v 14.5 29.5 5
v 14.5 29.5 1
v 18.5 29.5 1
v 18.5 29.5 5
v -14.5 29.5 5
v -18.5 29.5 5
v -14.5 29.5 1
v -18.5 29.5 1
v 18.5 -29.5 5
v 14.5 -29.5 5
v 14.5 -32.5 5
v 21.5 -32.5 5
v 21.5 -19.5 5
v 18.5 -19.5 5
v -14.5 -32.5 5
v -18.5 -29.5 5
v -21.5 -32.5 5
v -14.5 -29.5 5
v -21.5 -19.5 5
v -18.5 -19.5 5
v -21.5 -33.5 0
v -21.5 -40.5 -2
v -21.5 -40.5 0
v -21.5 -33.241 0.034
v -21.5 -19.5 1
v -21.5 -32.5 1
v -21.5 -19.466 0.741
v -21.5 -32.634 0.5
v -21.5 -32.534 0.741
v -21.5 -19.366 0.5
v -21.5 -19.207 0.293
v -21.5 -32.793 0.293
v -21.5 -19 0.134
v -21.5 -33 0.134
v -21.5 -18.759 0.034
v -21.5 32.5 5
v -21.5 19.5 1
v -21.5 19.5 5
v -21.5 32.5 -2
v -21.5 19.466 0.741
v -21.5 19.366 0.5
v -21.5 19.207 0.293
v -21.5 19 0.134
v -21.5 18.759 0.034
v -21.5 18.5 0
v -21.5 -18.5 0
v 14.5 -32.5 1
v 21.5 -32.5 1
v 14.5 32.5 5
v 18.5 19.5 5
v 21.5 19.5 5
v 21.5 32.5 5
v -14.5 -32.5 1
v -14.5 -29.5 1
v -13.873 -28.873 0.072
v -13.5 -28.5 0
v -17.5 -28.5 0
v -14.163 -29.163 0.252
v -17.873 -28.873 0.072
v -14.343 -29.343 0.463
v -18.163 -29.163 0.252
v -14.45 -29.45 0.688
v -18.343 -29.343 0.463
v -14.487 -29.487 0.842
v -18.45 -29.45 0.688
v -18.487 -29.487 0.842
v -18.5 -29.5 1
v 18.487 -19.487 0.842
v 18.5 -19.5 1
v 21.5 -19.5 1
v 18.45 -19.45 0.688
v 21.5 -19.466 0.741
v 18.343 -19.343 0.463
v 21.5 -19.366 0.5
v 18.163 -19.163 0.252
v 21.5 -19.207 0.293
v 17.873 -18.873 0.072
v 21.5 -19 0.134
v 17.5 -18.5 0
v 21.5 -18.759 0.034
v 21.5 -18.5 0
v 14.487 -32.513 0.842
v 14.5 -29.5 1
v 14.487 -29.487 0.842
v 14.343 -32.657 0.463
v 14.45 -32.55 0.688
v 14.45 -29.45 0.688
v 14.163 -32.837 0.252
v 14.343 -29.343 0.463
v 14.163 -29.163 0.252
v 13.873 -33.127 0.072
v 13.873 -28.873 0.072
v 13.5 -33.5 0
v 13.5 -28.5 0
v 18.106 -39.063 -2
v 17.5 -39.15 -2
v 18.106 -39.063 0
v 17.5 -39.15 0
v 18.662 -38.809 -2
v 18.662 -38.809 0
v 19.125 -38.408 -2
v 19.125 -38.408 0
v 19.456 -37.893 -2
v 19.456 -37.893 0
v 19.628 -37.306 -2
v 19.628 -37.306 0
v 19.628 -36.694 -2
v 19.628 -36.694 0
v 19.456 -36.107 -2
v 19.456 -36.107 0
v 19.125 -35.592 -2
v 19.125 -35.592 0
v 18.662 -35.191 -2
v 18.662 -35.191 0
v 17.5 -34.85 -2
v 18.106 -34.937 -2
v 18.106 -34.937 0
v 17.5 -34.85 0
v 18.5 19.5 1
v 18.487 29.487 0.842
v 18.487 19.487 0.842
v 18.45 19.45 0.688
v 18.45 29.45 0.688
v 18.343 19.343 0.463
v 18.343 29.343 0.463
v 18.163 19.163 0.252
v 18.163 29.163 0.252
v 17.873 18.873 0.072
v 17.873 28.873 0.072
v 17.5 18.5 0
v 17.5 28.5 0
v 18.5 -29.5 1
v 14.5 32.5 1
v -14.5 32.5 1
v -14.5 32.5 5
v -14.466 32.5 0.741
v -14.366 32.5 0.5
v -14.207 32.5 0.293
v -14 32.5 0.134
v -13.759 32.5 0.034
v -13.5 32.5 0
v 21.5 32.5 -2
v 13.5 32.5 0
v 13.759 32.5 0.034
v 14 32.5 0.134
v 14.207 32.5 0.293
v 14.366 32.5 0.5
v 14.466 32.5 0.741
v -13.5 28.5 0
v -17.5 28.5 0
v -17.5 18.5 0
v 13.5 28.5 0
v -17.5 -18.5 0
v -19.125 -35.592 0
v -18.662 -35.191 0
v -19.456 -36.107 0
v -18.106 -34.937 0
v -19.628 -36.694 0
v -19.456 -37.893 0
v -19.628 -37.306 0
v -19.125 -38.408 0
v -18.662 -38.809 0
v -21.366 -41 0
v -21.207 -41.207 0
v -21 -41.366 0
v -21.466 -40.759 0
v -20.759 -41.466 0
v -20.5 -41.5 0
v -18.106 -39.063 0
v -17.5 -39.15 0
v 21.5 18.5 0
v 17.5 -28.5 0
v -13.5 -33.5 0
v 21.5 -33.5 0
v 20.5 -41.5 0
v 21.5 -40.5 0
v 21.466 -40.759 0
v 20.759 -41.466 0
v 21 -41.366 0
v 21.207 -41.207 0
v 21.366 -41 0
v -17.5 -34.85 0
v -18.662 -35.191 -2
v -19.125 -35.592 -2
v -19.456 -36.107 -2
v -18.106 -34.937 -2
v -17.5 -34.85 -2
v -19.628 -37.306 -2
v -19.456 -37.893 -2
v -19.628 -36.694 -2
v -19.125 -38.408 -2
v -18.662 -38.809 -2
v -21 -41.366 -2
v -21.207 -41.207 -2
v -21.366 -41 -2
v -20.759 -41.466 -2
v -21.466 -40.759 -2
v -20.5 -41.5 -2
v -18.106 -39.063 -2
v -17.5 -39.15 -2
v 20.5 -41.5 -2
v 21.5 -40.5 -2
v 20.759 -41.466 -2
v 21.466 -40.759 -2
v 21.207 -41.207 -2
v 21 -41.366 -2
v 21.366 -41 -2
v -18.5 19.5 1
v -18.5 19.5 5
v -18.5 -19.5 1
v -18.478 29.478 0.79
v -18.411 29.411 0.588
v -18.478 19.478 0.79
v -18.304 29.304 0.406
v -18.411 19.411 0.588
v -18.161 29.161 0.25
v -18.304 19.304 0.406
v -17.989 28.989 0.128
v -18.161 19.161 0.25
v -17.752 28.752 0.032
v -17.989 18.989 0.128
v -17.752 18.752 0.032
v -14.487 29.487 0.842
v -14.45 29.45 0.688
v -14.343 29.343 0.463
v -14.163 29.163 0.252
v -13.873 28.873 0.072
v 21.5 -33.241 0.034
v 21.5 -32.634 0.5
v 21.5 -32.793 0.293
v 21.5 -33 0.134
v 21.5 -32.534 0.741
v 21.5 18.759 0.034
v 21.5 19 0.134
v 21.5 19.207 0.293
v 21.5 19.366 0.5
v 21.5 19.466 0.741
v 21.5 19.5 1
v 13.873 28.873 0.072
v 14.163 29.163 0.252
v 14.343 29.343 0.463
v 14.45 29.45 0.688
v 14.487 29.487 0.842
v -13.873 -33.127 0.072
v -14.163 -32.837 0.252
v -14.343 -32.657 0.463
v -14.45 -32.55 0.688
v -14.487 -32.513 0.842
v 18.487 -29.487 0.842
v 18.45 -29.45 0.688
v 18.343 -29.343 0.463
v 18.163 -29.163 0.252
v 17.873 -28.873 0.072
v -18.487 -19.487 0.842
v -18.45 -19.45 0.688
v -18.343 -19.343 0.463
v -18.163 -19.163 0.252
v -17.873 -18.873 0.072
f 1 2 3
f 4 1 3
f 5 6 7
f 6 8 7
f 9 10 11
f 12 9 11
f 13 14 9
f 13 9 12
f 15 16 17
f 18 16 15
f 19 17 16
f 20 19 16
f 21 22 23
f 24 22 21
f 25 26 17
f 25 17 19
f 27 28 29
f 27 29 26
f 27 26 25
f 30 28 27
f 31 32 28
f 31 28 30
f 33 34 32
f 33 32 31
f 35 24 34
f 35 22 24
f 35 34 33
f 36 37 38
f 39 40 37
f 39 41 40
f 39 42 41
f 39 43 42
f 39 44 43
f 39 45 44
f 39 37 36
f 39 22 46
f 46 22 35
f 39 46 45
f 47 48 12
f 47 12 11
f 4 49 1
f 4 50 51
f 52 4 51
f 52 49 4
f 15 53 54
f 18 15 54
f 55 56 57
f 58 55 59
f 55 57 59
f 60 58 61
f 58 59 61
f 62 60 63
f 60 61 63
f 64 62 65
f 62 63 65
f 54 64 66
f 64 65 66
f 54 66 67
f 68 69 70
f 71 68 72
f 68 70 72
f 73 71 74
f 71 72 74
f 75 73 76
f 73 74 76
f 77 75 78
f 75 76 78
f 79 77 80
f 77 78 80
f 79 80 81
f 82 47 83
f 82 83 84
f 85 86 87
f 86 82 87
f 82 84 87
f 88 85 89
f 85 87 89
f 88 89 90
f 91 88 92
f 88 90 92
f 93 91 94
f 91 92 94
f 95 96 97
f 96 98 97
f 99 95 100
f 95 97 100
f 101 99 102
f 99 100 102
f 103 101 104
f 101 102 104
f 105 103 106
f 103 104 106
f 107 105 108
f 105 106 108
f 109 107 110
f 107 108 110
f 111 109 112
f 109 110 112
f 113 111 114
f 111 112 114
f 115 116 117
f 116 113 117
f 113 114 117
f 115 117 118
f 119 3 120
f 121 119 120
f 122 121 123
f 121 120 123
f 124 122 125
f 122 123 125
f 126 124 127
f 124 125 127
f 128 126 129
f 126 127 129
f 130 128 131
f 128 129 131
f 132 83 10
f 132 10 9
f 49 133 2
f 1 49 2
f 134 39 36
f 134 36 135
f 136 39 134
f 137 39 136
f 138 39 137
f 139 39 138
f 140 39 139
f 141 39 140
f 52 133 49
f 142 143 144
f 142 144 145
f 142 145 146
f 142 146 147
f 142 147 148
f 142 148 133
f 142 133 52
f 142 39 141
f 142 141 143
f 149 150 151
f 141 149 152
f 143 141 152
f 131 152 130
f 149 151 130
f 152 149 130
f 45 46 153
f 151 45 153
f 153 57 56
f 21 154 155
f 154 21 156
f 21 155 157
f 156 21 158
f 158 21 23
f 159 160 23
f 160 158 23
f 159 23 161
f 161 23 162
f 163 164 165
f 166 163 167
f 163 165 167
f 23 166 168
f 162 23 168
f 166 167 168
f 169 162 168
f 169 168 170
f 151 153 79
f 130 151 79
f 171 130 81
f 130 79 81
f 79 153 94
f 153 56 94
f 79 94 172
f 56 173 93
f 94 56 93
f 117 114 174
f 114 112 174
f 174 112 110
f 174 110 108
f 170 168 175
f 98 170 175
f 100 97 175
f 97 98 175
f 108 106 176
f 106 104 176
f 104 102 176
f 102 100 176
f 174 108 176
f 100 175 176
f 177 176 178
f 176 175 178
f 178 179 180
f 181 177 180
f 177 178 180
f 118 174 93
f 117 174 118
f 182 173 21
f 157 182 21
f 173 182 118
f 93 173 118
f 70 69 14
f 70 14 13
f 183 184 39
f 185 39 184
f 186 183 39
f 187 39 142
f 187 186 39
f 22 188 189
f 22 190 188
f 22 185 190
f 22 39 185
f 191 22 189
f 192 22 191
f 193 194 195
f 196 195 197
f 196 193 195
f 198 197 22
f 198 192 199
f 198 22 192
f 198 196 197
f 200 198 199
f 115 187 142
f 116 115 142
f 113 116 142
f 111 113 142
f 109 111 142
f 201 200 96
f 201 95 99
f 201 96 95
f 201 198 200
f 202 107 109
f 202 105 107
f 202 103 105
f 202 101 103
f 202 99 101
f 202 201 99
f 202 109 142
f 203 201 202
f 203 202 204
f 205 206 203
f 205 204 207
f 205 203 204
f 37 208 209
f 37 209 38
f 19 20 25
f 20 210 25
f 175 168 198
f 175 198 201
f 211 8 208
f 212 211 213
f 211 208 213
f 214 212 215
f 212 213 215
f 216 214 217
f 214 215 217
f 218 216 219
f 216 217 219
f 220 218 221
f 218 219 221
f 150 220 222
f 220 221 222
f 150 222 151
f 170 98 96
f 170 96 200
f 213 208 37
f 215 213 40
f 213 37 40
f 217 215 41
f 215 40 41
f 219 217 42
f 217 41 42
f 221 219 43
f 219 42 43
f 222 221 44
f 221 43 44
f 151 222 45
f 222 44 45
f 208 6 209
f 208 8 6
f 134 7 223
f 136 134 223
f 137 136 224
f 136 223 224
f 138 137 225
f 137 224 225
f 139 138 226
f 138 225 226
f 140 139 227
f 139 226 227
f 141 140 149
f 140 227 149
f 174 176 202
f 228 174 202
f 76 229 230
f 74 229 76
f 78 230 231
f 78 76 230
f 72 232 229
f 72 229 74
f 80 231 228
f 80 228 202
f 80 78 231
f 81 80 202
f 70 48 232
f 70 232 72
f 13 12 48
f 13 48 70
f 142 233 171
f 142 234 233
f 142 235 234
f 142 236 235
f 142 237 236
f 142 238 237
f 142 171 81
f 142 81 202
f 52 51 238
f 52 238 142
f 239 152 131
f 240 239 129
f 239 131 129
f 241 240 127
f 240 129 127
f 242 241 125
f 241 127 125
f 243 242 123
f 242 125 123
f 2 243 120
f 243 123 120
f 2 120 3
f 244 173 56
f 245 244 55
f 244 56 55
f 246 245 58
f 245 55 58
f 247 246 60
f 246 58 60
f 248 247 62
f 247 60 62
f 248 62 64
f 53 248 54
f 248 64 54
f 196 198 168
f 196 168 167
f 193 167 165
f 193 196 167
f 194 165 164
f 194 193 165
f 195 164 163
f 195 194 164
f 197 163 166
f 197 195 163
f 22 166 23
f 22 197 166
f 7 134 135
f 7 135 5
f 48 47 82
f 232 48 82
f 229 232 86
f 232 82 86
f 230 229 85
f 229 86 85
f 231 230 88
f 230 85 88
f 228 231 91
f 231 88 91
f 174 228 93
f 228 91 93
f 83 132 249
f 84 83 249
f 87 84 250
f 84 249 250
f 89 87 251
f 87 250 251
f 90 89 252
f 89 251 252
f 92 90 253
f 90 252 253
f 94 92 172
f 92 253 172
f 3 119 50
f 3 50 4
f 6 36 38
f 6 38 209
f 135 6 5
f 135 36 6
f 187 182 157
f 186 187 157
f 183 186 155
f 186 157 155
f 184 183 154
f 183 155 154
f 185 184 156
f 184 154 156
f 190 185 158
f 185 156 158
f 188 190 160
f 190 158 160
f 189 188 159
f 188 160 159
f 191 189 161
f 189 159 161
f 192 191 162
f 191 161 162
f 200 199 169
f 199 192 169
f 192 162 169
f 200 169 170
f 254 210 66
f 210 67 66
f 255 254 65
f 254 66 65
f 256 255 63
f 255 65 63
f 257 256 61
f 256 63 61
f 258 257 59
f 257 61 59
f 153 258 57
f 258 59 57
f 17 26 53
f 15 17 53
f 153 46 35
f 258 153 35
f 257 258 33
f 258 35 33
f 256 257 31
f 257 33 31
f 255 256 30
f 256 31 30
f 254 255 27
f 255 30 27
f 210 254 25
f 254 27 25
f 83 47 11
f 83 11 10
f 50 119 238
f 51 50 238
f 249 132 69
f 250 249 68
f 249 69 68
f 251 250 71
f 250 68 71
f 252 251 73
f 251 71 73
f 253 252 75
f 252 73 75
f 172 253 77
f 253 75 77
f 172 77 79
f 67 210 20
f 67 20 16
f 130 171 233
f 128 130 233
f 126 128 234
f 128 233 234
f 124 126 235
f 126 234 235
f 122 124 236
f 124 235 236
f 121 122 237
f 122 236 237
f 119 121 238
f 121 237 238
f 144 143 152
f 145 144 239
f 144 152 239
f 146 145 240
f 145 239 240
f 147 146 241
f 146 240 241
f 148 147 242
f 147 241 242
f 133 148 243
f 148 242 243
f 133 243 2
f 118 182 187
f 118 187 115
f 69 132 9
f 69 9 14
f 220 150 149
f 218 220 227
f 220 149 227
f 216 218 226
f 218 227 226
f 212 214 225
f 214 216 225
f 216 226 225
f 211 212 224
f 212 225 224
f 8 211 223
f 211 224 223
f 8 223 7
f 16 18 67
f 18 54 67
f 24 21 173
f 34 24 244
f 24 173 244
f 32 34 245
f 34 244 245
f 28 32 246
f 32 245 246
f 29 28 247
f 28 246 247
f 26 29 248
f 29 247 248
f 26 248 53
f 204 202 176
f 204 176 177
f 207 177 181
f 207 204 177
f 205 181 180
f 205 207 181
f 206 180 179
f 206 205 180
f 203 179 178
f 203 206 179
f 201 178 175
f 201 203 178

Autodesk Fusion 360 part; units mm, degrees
sketch "Sketch1" plane through (0, 0, 0) normal (0, 0, 1) x (1, 0, 0)
  line L0 (18.5, 29.5) -> (-18.5, 29.5) construction
  line L1 (-18.5, 29.5) -> (-18.5, -29.5) construction
  line L2 (-18.5, -29.5) -> (18.5, -29.5) construction
  line L3 (18.5, -29.5) -> (18.5, 29.5) construction
  line L4 (18.5, 29.5) -> (-18.5, -29.5) construction
  line L5 (-18.5, 29.5) -> (18.5, -29.5) construction
  line L6 (-18.5, 19.5) -> (-21.5, 19.5)
  line L7 (-21.5, 19.5) -> (-21.5, 32.5)
  line L8 (-21.5, 32.5) -> (-14.5, 32.5)
  line L9 (-14.5, 32.5) -> (-14.5, 29.5)
  line L10 (0, 29.5) -> (0, -29.5) construction
  line L11 (21.5, 32.5) -> (14.5, 32.5)
  line L12 (21.5, 19.5) -> (21.5, 32.5)
  line L13 (18.5, 19.5) -> (21.5, 19.5)
  line L14 (14.5, 32.5) -> (14.5, 29.5)
  line L15 (-18.5, 0) -> (18.5, 0) construction
  line L16 (-18.5, -19.5) -> (-21.5, -19.5)
  line L17 (-21.5, -19.5) -> (-21.5, -32.5)
  line L18 (-21.5, -32.5) -> (-14.5, -32.5)
  line L19 (-14.5, -32.5) -> (-14.5, -29.5)
  line L20 (21.5, -32.5) -> (14.5, -32.5)
  line L21 (14.5, -32.5) -> (14.5, -29.5)
  line L22 (21.5, -19.5) -> (21.5, -32.5)
  line L23 (18.5, -19.5) -> (21.5, -19.5)
  line L24 (14.5, 29.5) -> (18.5, 29.5)
  line L25 (18.5, 19.5) -> (18.5, 29.5)
  line L26 (-18.5, 29.5) -> (-18.5, 19.5)
  line L27 (-18.5, 29.5) -> (-14.5, 29.5)
  line L28 (-18.5, -19.5) -> (-18.5, -29.5)
  line L29 (-14.5, -29.5) -> (-18.5, -29.5)
  line L30 (14.5, -29.5) -> (18.5, -29.5)
  line L31 (18.5, -29.5) -> (18.5, -19.5)
  dimension "d1" = 59
  dimension "d2" = 37
  dimension "d3" = 13
  dimension "d4" = 3
  dimension "d5" = 4
  dimension "d6" = 3
extrude "Extrude1" add sketch "Sketch1" along normal blind 5 makes body 1 at (-21.5, 23.8333, 1.6667) makes body 2 at (-21.5, -23.8333, 1.6667) makes body 3 at (21.5, 23.8333, 1.6667) makes body 4 at (21.5, -23.8333, 1.6667)
sketch "Sketch2" plane through (0, 0, 0) normal (0, 0, -1) x (1, 0, 0)
  line L0 (-21.5, 19.5) -> (-18.5, 19.5)
  line L1 (-18.5, 19.5) -> (-18.5, 29.5)
  line L2 (-18.5, 29.5) -> (-14.5, 29.5)
  line L3 (-14.5, 29.5) -> (-14.5, 32.5)
  line L4 (-14.5, 32.5) -> (-21.5, 32.5)
  line L5 (-21.5, 32.5) -> (-21.5, 19.5)
  line L6 (-21.5, 32.5) -> (21.5, 32.5) construction
  line L7 (21.5, 32.5) -> (21.5, -32.5)
  line L8 (21.5, -32.5) -> (-21.5, -32.5)
  line L9 (-21.5, -32.5) -> (-21.5, 32.5)
  line L10 (5, 32.5) -> (-5, 32.5) construction
  line L11 (0, -32.5) -> (0, 32.5) construction
  line L12 (21.5, 32.5) -> (-21.5, 32.5)
  line L13 (-21.5, 32.5) -> (-21.5, 41.5)
  line L14 (-21.5, 41.5) -> (21.5, 41.5)
  line L15 (21.5, 41.5) -> (21.5, 32.5)
  line L16 (21.5, 37) -> (-21.5, 37) construction
  line L17 (0, 32.5) -> (0, 41.5) construction
  line L18 (17.5, 39.15) -> (-17.5, 39.15)
  arc A0 (-17.5, 39.15) -> (-17.5, 34.85) centre (-17.5, 37) ccw
  line L19 (-17.5, 34.85) -> (17.5, 34.85)
  arc A1 (17.5, 34.85) -> (17.5, 39.15) centre (17.5, 37) ccw
  line L20 (17.5, 37) -> (-17.5, 37) construction
  point P0 (0, 37)
  dimension "d9" = 10
  dimension "d10" = 9
  dimension "d11" = 35
  dimension "d12" = 4.3
extrude "Extrude2" add sketch "Sketch2" along normal blind 2 bodies 1 2 3 4
fillet "Fillet1" radius 1 16 edges at (-20, 19.5, 0) (-18.5, 24.5, 0) (-16.5, 29.5, 0) (-14.5, 31, 0) (14.5, 31, 0) (16.5, 29.5, 0) (18.5, 24.5, 0) (20, 19.5, 0) (20, -19.5, 0) (18.5, -24.5, 0) (16.5, -29.5, 0) (14.5, -31, 0) (-14.5, -31, 0) (-16.5, -29.5, 0) (-18.5, -24.5, 0) (-20, -19.5, 0) on bodies 1
fillet "Fillet1" radius 1 4 edges at (-21.5, -41.5, -1) (21.5, -41.5, -1) (18, -32.5, 0) (-18, -32.5, 0) on bodies 1
